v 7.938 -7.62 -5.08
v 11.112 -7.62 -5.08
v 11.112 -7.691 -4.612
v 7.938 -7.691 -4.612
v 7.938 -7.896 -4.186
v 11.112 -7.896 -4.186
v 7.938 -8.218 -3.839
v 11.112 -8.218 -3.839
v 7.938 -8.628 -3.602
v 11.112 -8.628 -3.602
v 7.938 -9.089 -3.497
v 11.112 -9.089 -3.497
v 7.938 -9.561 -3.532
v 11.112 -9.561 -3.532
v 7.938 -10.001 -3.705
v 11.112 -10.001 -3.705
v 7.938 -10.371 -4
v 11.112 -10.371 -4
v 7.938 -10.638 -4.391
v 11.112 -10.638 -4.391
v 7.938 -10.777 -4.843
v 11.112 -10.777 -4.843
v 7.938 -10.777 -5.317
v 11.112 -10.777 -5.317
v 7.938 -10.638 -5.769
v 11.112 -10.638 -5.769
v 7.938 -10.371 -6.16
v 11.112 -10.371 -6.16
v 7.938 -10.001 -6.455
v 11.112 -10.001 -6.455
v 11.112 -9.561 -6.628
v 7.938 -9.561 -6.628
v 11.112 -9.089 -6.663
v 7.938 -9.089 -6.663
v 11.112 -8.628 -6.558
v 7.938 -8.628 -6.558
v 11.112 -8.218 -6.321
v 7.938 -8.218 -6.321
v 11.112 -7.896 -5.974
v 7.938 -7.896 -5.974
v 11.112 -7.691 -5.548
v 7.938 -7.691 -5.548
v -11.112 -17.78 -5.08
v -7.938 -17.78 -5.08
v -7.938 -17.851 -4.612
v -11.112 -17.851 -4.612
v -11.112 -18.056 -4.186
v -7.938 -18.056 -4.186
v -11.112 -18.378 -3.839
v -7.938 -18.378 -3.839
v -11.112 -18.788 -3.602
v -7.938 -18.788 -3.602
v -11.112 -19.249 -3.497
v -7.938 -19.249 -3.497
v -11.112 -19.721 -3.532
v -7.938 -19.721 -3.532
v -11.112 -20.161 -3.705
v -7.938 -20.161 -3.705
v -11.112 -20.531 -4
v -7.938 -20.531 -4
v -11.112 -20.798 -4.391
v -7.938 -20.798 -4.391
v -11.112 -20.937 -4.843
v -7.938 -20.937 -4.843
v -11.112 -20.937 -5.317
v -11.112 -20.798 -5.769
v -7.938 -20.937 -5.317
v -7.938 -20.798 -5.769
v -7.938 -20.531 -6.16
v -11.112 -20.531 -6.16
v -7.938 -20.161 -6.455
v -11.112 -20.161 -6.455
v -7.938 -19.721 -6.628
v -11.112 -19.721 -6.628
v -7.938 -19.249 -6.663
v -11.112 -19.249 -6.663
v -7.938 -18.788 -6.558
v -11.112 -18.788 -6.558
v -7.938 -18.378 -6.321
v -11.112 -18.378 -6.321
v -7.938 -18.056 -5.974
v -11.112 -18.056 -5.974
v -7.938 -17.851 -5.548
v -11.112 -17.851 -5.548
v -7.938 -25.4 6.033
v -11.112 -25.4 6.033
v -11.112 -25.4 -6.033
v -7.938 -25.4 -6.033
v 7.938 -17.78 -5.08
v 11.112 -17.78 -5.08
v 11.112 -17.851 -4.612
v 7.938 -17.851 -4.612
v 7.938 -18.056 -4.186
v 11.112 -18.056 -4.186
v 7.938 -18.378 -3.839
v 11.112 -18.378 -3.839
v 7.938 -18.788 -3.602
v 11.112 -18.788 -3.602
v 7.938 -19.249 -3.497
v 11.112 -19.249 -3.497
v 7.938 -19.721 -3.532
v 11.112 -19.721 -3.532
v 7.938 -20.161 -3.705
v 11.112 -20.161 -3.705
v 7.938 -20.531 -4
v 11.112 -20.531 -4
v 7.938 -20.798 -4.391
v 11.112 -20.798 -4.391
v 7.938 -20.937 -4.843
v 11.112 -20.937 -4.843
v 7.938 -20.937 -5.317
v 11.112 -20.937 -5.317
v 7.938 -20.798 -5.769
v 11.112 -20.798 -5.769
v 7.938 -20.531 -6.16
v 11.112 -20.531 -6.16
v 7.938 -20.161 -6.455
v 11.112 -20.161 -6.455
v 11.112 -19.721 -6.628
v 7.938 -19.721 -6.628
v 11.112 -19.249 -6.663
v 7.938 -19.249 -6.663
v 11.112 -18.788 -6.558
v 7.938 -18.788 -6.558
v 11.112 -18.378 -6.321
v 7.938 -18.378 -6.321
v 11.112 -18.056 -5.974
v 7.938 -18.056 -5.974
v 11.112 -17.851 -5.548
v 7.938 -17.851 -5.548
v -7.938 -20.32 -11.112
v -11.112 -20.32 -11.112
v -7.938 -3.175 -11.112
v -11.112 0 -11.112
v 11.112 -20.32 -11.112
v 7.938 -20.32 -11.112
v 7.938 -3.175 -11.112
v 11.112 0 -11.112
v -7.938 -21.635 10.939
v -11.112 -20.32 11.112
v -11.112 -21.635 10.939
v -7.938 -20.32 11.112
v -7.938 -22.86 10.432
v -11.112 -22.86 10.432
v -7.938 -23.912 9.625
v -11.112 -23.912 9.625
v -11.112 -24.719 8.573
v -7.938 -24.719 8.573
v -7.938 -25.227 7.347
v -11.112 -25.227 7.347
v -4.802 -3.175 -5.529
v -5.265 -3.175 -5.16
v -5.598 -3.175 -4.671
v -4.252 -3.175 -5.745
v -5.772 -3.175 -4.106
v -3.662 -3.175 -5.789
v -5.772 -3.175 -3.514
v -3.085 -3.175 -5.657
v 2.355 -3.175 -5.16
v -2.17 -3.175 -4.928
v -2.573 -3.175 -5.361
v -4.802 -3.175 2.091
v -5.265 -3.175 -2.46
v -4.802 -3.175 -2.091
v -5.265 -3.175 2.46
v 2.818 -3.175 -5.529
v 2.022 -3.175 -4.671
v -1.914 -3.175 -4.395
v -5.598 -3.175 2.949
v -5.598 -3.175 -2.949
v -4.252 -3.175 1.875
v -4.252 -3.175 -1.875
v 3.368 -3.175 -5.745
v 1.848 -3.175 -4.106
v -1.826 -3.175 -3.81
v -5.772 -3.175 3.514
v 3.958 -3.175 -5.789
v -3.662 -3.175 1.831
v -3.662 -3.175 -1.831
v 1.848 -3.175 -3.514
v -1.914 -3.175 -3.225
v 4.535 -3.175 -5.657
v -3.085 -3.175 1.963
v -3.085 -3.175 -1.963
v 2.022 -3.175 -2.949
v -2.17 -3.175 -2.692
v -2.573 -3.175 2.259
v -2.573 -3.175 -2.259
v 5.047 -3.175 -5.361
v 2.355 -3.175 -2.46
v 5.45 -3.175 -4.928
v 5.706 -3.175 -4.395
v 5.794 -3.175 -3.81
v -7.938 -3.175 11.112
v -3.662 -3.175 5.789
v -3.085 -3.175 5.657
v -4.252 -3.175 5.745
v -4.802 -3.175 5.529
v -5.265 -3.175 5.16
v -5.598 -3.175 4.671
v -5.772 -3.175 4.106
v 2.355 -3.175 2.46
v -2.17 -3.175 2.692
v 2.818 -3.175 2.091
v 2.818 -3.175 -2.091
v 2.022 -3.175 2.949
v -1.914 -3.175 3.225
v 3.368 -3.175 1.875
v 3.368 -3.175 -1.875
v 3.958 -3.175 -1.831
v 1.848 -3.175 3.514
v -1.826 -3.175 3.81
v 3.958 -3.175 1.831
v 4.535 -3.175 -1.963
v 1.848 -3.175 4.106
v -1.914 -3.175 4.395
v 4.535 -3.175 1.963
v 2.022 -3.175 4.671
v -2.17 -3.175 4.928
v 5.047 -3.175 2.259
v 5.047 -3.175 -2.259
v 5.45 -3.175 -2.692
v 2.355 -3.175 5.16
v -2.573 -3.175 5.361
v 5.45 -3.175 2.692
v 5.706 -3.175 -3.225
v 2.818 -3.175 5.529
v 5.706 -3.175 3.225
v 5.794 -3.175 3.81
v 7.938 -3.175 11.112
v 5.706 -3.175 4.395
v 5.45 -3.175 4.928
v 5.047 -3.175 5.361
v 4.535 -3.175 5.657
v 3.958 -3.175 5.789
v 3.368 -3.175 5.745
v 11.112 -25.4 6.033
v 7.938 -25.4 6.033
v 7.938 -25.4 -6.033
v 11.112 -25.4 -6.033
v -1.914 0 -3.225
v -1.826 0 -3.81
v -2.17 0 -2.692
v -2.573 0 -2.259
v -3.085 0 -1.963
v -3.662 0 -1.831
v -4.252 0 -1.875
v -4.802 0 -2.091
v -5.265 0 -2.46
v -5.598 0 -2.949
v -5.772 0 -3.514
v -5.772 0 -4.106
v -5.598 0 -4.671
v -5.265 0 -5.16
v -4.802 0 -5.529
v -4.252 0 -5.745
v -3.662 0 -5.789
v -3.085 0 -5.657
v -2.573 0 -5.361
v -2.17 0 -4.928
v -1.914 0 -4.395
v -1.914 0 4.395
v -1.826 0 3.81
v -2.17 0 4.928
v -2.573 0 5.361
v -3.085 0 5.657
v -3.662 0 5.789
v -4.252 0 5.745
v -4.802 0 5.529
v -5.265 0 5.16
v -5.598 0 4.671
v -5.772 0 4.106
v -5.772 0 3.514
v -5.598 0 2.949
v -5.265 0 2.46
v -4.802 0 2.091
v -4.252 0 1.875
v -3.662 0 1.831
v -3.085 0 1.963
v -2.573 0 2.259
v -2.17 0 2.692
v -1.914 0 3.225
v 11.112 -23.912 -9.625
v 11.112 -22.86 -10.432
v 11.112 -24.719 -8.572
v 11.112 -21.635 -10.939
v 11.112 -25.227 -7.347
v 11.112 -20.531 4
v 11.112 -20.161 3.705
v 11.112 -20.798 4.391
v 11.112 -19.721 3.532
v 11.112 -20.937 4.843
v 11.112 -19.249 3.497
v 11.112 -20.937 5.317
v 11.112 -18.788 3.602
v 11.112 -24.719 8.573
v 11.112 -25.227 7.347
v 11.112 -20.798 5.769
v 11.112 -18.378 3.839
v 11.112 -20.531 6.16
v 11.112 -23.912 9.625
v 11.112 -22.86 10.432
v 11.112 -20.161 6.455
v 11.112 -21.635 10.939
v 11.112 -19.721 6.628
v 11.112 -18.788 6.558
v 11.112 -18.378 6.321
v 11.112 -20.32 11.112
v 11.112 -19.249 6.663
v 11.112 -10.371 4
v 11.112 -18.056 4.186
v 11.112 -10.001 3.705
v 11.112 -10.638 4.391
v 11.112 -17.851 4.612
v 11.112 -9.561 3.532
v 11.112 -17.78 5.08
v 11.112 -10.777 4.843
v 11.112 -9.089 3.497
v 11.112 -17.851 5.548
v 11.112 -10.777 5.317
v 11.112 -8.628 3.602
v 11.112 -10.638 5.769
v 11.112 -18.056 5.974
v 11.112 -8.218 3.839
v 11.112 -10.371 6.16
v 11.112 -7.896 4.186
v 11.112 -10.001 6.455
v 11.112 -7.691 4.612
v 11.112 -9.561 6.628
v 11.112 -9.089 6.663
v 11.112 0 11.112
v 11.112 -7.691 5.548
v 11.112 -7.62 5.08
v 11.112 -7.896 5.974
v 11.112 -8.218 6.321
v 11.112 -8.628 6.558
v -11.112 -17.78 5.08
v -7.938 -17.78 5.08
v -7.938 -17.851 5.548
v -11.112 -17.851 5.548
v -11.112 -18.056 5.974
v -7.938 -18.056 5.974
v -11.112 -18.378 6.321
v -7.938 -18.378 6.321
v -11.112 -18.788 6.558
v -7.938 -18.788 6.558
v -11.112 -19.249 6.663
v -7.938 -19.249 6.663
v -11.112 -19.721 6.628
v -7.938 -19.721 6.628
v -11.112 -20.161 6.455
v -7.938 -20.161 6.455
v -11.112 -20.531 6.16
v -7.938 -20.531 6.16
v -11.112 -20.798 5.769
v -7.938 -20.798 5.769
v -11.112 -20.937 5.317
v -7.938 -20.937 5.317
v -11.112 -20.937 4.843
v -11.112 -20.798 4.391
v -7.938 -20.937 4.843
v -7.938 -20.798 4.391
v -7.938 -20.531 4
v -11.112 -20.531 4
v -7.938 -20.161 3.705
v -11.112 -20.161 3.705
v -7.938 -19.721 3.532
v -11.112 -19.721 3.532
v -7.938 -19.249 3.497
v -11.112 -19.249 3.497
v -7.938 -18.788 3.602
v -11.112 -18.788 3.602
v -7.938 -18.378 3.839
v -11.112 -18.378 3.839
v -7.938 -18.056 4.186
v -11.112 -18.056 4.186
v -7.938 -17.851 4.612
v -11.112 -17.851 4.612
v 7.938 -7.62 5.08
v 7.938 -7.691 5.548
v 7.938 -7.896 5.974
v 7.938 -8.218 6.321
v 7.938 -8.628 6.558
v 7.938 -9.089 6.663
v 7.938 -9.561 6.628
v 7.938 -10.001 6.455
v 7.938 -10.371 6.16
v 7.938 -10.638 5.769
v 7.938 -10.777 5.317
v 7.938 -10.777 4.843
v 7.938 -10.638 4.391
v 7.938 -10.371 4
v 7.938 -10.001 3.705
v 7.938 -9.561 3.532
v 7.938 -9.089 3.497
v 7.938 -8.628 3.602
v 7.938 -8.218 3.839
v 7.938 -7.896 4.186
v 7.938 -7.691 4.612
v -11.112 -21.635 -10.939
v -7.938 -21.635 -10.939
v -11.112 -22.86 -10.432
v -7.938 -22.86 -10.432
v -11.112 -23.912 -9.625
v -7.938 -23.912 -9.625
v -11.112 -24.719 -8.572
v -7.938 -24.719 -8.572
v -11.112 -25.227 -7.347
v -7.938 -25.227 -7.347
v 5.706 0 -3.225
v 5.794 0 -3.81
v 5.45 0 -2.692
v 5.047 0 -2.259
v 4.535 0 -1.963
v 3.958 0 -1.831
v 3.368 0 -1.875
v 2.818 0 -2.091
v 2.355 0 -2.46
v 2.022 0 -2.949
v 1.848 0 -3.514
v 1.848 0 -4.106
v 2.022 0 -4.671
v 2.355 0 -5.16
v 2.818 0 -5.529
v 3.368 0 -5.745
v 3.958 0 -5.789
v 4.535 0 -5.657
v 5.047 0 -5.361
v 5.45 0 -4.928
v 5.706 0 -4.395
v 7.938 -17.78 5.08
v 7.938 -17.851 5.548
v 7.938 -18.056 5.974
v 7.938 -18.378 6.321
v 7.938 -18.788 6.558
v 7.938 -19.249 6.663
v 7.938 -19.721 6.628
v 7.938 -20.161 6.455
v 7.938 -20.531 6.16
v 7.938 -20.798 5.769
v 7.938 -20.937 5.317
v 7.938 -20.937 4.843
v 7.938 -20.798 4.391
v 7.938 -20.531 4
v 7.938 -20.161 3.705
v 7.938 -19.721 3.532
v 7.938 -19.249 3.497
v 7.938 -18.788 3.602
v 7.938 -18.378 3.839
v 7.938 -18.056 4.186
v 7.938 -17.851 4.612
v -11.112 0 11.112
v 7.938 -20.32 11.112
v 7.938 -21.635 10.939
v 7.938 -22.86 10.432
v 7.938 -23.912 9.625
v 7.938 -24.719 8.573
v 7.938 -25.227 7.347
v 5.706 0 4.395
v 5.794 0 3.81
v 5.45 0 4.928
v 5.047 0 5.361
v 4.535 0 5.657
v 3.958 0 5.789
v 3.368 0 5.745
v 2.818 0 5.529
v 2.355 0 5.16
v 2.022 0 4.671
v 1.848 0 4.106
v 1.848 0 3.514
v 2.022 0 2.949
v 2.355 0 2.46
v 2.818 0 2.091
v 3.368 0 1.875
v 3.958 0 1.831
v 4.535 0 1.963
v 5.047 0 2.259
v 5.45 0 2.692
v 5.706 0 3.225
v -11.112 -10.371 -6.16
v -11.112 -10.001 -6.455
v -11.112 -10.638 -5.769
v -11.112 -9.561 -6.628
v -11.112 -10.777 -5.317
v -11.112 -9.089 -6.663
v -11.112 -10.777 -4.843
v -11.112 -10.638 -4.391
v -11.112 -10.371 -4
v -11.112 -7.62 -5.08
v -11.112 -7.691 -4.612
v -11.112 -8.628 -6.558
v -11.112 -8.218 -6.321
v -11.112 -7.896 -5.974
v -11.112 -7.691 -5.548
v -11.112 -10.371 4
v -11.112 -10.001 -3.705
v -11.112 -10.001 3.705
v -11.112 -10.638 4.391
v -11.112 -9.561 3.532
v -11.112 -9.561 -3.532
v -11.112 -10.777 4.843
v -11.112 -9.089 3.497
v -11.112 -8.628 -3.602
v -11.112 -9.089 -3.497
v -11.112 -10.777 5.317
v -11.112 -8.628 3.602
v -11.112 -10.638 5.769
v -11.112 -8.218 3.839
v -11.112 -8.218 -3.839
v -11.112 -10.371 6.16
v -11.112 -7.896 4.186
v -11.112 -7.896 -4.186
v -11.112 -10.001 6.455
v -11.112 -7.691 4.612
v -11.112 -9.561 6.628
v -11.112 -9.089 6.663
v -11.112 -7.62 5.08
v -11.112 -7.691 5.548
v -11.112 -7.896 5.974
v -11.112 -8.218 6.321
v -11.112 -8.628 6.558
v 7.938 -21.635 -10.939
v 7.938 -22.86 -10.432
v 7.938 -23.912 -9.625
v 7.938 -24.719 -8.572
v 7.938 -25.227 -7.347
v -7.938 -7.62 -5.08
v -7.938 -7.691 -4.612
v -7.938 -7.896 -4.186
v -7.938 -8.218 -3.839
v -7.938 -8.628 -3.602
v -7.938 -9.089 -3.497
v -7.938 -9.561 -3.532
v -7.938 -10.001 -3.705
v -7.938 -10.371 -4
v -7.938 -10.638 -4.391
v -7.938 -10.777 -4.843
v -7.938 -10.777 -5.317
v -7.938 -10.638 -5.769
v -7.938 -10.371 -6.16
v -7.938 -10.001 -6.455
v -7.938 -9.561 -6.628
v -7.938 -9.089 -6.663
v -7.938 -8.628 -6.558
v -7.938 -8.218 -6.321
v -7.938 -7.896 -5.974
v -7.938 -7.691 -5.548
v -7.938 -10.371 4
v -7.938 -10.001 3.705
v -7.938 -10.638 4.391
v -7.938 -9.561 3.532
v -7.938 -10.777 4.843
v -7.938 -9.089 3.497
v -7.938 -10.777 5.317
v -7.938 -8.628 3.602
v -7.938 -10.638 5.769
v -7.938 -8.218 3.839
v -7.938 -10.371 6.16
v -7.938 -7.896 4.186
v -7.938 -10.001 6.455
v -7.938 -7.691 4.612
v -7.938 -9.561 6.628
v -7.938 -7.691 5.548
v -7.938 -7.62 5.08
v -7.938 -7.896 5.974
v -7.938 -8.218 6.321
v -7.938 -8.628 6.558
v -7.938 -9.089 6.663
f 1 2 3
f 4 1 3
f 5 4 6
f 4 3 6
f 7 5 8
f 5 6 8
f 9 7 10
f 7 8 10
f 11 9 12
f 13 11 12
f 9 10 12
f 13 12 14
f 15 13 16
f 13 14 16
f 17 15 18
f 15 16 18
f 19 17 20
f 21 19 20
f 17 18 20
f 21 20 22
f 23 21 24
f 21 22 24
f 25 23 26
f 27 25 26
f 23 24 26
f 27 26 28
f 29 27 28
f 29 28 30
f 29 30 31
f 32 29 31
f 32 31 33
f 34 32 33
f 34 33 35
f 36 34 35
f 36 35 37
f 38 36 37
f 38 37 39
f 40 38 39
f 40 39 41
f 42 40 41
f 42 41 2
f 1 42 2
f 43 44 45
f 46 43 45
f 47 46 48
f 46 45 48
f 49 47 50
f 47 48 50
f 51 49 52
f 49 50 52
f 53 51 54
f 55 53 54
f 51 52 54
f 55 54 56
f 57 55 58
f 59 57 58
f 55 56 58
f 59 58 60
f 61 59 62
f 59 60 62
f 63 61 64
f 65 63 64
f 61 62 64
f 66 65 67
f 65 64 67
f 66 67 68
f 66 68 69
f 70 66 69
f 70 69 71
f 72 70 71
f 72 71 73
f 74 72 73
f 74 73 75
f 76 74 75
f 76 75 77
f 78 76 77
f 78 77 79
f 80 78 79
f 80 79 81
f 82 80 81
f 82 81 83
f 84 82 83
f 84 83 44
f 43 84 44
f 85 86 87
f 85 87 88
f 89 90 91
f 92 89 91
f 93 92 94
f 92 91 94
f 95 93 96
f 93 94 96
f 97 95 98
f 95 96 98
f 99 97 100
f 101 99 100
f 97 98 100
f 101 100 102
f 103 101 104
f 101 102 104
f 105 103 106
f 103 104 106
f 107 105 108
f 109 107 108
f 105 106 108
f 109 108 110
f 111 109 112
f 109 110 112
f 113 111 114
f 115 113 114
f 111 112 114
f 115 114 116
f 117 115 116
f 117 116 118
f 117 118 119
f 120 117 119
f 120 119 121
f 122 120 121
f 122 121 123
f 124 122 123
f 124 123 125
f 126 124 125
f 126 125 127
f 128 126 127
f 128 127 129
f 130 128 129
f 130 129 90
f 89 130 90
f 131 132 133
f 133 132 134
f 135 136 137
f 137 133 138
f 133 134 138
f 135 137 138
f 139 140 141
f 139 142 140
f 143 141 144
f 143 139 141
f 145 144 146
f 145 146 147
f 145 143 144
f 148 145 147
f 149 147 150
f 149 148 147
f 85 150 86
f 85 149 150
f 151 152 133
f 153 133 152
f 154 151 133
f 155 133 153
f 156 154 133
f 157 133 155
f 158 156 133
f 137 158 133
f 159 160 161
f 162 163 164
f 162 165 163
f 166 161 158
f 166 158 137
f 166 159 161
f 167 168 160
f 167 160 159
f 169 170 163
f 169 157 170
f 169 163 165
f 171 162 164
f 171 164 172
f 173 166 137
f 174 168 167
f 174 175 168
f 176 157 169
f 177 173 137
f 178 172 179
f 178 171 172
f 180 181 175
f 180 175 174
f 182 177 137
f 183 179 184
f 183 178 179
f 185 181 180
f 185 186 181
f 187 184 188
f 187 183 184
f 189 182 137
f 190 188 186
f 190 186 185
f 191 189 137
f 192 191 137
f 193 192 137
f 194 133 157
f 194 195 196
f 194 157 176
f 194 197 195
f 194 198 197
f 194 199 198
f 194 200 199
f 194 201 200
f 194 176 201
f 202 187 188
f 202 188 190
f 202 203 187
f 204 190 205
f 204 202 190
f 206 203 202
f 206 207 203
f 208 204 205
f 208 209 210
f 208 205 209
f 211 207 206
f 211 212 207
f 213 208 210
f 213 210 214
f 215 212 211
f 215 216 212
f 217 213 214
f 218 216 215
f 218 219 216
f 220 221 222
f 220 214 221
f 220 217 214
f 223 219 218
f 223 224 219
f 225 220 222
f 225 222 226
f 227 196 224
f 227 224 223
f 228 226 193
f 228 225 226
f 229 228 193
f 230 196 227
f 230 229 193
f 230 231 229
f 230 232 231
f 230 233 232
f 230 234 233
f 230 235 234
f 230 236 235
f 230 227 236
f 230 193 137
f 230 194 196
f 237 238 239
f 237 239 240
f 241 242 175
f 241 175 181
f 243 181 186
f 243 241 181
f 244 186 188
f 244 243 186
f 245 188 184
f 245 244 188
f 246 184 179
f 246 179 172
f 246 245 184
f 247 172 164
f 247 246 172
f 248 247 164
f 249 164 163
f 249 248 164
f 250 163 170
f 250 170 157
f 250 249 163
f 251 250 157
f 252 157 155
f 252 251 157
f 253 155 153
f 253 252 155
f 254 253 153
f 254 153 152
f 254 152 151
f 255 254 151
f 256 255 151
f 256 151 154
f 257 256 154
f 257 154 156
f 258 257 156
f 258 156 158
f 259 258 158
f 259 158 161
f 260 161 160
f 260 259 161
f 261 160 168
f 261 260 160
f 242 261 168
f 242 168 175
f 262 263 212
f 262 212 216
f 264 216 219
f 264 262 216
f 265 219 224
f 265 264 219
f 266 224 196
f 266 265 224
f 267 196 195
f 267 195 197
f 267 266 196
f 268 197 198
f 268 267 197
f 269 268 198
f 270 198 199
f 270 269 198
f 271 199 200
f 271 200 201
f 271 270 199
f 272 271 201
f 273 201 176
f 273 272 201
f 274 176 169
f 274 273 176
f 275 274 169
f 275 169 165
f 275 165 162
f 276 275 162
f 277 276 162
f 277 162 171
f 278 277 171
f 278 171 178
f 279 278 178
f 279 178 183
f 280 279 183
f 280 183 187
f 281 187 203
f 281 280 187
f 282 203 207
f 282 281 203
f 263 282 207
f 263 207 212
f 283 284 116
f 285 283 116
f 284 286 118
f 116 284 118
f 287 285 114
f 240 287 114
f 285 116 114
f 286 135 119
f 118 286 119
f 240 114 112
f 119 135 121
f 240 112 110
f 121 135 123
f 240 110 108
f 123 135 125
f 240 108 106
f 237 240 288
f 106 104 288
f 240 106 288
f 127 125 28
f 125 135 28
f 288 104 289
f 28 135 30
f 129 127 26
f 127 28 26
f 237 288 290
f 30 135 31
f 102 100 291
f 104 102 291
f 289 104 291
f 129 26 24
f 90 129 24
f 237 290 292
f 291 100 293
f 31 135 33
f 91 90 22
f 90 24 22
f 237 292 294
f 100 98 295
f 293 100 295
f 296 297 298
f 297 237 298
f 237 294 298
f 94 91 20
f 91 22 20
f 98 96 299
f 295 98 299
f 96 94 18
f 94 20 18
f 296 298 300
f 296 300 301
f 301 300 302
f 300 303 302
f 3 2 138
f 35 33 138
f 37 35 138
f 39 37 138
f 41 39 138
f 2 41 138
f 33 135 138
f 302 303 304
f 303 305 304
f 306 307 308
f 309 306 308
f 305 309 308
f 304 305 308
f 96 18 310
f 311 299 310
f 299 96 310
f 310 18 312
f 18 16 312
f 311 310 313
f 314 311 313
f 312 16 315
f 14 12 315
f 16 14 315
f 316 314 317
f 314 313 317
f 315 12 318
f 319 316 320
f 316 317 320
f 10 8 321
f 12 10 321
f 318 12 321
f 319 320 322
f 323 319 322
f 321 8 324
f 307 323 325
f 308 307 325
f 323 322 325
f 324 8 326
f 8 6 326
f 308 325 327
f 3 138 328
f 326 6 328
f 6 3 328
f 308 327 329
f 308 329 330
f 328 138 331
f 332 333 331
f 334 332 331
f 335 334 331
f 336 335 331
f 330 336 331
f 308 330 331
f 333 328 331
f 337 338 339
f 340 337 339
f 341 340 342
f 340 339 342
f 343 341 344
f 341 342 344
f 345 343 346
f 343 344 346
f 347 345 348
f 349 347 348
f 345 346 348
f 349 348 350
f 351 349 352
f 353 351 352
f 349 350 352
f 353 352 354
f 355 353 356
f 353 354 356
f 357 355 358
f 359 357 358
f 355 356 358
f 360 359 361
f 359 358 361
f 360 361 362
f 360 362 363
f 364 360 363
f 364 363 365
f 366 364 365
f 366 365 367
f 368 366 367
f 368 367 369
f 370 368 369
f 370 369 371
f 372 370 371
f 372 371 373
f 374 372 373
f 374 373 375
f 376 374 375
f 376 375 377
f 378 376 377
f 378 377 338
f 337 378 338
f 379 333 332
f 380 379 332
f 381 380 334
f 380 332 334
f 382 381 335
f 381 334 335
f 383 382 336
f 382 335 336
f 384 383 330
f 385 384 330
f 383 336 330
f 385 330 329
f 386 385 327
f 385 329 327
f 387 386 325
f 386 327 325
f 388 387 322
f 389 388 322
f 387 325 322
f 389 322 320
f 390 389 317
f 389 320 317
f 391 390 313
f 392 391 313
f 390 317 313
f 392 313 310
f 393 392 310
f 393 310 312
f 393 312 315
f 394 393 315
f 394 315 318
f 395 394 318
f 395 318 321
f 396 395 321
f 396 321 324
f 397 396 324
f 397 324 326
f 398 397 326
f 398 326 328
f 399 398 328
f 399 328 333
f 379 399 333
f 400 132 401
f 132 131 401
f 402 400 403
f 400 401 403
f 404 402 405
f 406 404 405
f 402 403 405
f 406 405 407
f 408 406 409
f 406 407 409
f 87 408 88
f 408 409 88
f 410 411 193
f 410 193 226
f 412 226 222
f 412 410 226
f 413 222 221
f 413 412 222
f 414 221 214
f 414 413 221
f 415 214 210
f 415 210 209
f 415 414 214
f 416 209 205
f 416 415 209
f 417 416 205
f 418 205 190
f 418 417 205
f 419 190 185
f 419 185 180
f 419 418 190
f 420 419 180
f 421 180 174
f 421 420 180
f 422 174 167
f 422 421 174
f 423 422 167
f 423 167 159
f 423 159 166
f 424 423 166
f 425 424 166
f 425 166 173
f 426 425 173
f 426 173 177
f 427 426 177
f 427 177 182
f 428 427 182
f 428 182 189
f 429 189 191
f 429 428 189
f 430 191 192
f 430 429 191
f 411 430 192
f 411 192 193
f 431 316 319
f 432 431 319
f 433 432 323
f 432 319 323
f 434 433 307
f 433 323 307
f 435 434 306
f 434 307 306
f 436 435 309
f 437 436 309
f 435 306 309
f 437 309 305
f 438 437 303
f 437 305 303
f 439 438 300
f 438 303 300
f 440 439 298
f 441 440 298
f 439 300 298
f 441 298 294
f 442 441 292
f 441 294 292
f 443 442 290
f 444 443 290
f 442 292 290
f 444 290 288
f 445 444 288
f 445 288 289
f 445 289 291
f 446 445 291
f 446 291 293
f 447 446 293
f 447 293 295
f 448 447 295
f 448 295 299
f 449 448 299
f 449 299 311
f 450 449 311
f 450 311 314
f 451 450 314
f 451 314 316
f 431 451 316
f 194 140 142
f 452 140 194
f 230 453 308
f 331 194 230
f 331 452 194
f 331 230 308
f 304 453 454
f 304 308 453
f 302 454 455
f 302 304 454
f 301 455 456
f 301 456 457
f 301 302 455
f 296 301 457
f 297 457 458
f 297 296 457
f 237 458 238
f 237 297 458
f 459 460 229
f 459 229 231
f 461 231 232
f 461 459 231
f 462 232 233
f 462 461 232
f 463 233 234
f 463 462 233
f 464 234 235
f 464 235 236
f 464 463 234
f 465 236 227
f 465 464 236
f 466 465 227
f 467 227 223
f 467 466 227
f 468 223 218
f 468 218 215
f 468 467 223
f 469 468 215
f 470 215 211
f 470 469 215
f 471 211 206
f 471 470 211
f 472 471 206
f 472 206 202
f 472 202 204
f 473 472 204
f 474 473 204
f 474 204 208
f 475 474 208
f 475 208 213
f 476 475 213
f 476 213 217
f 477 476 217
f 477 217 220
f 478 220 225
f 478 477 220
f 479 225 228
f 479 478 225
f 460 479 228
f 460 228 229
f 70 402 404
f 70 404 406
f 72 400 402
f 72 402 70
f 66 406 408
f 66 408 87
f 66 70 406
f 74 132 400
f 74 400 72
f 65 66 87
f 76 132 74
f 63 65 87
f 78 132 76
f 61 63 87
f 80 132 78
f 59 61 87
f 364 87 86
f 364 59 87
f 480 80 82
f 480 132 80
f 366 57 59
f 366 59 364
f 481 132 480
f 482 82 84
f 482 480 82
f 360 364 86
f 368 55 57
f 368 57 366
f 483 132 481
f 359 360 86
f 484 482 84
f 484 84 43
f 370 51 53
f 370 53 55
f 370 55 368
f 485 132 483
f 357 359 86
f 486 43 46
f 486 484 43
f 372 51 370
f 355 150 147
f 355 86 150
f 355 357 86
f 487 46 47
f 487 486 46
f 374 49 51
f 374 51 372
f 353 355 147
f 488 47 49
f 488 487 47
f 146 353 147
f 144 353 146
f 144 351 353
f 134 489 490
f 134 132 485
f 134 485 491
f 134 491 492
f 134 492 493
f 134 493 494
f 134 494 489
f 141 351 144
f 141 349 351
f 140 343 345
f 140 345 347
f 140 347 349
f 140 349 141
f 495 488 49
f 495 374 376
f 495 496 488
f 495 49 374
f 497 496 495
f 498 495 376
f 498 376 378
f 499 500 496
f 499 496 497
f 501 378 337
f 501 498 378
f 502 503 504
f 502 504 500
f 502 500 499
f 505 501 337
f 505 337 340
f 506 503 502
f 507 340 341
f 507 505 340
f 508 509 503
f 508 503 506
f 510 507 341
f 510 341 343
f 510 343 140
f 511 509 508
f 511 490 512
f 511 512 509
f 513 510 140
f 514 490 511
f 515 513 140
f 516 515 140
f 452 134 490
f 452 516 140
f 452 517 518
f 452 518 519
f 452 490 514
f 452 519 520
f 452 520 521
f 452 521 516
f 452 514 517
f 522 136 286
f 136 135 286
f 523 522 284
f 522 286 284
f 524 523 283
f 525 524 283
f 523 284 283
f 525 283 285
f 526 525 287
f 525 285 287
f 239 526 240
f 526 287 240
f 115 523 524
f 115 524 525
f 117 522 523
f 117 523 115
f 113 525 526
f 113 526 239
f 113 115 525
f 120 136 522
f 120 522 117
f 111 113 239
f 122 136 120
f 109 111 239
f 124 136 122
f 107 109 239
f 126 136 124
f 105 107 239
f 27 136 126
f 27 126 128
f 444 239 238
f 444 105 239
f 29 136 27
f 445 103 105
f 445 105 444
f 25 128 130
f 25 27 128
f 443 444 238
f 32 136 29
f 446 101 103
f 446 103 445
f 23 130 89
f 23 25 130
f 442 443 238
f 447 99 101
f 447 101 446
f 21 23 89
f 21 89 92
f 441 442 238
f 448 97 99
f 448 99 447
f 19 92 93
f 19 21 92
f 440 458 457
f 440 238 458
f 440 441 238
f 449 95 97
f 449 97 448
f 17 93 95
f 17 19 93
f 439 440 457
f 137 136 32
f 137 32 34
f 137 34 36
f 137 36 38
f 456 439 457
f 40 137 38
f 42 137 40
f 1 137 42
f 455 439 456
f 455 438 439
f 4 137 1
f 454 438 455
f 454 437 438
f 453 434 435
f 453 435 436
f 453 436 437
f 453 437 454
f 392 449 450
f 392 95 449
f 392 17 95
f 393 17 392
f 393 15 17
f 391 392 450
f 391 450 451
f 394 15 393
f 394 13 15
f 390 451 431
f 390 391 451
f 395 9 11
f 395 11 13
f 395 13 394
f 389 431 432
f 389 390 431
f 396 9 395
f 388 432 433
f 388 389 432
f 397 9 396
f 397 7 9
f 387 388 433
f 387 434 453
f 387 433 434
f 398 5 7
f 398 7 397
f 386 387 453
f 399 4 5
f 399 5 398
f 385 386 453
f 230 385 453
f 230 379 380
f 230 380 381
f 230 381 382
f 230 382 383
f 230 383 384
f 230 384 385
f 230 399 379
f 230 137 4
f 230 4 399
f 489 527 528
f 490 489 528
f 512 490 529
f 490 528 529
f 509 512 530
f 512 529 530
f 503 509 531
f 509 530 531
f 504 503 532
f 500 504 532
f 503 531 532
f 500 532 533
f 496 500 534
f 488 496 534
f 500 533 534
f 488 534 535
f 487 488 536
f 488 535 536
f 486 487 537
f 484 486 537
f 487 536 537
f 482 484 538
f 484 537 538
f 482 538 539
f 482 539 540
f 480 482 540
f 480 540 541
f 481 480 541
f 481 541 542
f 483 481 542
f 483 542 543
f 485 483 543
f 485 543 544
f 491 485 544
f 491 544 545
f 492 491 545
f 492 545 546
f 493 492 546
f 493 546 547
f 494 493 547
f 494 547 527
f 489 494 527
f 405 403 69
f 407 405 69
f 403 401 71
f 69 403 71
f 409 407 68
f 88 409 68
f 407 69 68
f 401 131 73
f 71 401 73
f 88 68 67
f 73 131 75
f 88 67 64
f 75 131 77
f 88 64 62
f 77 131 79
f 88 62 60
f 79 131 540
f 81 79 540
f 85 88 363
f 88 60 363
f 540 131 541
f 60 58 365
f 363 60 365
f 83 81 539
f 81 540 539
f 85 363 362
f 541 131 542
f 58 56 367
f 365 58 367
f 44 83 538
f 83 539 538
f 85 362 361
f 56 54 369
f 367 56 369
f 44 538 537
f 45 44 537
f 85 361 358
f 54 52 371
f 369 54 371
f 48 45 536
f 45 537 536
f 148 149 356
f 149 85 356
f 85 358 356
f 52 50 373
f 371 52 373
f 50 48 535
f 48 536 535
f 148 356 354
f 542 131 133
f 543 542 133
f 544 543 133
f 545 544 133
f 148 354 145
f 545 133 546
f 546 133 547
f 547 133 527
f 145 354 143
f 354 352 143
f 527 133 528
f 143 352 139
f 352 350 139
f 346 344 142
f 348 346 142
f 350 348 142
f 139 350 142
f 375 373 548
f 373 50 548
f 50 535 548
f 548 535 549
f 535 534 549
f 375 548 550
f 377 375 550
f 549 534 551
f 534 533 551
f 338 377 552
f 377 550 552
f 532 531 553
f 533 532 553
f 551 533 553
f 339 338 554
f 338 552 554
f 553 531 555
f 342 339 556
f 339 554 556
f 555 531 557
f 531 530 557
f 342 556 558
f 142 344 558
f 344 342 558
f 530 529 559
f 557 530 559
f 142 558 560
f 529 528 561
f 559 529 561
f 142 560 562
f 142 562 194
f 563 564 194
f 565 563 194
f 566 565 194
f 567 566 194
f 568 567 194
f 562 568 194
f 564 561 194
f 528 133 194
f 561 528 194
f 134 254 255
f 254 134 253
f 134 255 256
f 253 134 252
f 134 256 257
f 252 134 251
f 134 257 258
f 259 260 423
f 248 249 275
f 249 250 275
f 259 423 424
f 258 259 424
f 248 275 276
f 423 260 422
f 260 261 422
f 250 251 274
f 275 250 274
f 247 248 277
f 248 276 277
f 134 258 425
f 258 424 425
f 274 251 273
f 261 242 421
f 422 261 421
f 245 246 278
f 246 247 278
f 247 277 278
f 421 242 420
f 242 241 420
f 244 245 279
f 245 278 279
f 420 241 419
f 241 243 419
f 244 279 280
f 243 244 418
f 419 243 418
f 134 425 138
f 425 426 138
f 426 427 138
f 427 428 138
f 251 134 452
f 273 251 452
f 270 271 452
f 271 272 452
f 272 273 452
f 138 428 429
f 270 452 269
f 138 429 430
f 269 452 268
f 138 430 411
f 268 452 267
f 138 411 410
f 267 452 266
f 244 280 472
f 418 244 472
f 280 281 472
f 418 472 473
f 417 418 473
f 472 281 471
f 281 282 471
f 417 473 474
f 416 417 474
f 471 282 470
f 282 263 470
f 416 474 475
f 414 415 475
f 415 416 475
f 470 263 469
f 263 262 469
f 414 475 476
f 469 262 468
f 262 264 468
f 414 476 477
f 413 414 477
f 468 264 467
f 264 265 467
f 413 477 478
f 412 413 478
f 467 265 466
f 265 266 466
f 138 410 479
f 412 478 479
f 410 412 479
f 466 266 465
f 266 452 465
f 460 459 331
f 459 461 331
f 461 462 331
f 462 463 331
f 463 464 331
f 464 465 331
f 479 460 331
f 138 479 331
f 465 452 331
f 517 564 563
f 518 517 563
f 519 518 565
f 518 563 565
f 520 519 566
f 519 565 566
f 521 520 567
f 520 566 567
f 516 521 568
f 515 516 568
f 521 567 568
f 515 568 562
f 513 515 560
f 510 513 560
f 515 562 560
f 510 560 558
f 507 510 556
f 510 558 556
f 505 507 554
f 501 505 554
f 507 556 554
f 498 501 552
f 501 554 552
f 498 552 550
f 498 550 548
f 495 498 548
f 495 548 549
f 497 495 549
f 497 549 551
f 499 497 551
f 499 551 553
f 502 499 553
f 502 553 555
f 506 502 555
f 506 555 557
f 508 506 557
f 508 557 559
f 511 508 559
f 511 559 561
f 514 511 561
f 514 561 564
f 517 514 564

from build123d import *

# Parameters (mm, degrees)
F0_W     = 15.875
F0_H     = 22.225
F0_R     = 1.984375
F1_DEPTH = 3.175
F0_W_2   = 3.175
F2_DEPTH = 25.4
F3_R     = 1.5875
F4_DEPTH = 22.226
F5_R     = 5.08


with BuildPart() as f1:
    # F0 (on Front) → F1 (new body)
    with BuildSketch(Plane.XZ):
        Rectangle(F0_W, F0_H)
        with Locations((-3.81, -3.81)):
            Circle(F0_R, mode=Mode.SUBTRACT)
        with Locations((3.81, -3.81)):
            Circle(F0_R, mode=Mode.SUBTRACT)
        with Locations((-3.81, 3.81)):
            Circle(F0_R, mode=Mode.SUBTRACT)
        with Locations((3.81, 3.81)):
            Circle(F0_R, mode=Mode.SUBTRACT)
    extrude(amount=F1_DEPTH)

    # F0 (on Front) → F2 (join)
    with BuildSketch(Plane.XZ):
        with Locations((9.525, 0)):
            Rectangle(F0_W_2, F0_H)
        with Locations((-9.525, 0)):
            Rectangle(F0_W_2, F0_H)
    extrude(amount=F2_DEPTH)

    # F3 (on face) → F4 (cut, through all)
    with BuildSketch(Plane.YZ.offset(11.1125)):
        with Locations((-19.3675, 5.08)):
            Circle(F3_R)
        with Locations((-9.2075, 5.08)):
            Circle(F3_R)
        with Locations((-9.2075, -5.08)):
            Circle(F3_R)
        with Locations((-19.3675, -5.08)):
            Circle(F3_R)
    extrude(amount=-F4_DEPTH, mode=Mode.SUBTRACT)

    # F5
    f5_edges = [f1.edges().sort_by_distance(p)[0] for p in [
        (9.525, -25.4, 11.1125),
        (-9.525, -25.4, 11.1125),
        (9.525, -25.4, -11.1125),
        (-9.525, -25.4, -11.1125),
    ]]
    fillet(f5_edges, radius=F5_R)


solid = f1.part
